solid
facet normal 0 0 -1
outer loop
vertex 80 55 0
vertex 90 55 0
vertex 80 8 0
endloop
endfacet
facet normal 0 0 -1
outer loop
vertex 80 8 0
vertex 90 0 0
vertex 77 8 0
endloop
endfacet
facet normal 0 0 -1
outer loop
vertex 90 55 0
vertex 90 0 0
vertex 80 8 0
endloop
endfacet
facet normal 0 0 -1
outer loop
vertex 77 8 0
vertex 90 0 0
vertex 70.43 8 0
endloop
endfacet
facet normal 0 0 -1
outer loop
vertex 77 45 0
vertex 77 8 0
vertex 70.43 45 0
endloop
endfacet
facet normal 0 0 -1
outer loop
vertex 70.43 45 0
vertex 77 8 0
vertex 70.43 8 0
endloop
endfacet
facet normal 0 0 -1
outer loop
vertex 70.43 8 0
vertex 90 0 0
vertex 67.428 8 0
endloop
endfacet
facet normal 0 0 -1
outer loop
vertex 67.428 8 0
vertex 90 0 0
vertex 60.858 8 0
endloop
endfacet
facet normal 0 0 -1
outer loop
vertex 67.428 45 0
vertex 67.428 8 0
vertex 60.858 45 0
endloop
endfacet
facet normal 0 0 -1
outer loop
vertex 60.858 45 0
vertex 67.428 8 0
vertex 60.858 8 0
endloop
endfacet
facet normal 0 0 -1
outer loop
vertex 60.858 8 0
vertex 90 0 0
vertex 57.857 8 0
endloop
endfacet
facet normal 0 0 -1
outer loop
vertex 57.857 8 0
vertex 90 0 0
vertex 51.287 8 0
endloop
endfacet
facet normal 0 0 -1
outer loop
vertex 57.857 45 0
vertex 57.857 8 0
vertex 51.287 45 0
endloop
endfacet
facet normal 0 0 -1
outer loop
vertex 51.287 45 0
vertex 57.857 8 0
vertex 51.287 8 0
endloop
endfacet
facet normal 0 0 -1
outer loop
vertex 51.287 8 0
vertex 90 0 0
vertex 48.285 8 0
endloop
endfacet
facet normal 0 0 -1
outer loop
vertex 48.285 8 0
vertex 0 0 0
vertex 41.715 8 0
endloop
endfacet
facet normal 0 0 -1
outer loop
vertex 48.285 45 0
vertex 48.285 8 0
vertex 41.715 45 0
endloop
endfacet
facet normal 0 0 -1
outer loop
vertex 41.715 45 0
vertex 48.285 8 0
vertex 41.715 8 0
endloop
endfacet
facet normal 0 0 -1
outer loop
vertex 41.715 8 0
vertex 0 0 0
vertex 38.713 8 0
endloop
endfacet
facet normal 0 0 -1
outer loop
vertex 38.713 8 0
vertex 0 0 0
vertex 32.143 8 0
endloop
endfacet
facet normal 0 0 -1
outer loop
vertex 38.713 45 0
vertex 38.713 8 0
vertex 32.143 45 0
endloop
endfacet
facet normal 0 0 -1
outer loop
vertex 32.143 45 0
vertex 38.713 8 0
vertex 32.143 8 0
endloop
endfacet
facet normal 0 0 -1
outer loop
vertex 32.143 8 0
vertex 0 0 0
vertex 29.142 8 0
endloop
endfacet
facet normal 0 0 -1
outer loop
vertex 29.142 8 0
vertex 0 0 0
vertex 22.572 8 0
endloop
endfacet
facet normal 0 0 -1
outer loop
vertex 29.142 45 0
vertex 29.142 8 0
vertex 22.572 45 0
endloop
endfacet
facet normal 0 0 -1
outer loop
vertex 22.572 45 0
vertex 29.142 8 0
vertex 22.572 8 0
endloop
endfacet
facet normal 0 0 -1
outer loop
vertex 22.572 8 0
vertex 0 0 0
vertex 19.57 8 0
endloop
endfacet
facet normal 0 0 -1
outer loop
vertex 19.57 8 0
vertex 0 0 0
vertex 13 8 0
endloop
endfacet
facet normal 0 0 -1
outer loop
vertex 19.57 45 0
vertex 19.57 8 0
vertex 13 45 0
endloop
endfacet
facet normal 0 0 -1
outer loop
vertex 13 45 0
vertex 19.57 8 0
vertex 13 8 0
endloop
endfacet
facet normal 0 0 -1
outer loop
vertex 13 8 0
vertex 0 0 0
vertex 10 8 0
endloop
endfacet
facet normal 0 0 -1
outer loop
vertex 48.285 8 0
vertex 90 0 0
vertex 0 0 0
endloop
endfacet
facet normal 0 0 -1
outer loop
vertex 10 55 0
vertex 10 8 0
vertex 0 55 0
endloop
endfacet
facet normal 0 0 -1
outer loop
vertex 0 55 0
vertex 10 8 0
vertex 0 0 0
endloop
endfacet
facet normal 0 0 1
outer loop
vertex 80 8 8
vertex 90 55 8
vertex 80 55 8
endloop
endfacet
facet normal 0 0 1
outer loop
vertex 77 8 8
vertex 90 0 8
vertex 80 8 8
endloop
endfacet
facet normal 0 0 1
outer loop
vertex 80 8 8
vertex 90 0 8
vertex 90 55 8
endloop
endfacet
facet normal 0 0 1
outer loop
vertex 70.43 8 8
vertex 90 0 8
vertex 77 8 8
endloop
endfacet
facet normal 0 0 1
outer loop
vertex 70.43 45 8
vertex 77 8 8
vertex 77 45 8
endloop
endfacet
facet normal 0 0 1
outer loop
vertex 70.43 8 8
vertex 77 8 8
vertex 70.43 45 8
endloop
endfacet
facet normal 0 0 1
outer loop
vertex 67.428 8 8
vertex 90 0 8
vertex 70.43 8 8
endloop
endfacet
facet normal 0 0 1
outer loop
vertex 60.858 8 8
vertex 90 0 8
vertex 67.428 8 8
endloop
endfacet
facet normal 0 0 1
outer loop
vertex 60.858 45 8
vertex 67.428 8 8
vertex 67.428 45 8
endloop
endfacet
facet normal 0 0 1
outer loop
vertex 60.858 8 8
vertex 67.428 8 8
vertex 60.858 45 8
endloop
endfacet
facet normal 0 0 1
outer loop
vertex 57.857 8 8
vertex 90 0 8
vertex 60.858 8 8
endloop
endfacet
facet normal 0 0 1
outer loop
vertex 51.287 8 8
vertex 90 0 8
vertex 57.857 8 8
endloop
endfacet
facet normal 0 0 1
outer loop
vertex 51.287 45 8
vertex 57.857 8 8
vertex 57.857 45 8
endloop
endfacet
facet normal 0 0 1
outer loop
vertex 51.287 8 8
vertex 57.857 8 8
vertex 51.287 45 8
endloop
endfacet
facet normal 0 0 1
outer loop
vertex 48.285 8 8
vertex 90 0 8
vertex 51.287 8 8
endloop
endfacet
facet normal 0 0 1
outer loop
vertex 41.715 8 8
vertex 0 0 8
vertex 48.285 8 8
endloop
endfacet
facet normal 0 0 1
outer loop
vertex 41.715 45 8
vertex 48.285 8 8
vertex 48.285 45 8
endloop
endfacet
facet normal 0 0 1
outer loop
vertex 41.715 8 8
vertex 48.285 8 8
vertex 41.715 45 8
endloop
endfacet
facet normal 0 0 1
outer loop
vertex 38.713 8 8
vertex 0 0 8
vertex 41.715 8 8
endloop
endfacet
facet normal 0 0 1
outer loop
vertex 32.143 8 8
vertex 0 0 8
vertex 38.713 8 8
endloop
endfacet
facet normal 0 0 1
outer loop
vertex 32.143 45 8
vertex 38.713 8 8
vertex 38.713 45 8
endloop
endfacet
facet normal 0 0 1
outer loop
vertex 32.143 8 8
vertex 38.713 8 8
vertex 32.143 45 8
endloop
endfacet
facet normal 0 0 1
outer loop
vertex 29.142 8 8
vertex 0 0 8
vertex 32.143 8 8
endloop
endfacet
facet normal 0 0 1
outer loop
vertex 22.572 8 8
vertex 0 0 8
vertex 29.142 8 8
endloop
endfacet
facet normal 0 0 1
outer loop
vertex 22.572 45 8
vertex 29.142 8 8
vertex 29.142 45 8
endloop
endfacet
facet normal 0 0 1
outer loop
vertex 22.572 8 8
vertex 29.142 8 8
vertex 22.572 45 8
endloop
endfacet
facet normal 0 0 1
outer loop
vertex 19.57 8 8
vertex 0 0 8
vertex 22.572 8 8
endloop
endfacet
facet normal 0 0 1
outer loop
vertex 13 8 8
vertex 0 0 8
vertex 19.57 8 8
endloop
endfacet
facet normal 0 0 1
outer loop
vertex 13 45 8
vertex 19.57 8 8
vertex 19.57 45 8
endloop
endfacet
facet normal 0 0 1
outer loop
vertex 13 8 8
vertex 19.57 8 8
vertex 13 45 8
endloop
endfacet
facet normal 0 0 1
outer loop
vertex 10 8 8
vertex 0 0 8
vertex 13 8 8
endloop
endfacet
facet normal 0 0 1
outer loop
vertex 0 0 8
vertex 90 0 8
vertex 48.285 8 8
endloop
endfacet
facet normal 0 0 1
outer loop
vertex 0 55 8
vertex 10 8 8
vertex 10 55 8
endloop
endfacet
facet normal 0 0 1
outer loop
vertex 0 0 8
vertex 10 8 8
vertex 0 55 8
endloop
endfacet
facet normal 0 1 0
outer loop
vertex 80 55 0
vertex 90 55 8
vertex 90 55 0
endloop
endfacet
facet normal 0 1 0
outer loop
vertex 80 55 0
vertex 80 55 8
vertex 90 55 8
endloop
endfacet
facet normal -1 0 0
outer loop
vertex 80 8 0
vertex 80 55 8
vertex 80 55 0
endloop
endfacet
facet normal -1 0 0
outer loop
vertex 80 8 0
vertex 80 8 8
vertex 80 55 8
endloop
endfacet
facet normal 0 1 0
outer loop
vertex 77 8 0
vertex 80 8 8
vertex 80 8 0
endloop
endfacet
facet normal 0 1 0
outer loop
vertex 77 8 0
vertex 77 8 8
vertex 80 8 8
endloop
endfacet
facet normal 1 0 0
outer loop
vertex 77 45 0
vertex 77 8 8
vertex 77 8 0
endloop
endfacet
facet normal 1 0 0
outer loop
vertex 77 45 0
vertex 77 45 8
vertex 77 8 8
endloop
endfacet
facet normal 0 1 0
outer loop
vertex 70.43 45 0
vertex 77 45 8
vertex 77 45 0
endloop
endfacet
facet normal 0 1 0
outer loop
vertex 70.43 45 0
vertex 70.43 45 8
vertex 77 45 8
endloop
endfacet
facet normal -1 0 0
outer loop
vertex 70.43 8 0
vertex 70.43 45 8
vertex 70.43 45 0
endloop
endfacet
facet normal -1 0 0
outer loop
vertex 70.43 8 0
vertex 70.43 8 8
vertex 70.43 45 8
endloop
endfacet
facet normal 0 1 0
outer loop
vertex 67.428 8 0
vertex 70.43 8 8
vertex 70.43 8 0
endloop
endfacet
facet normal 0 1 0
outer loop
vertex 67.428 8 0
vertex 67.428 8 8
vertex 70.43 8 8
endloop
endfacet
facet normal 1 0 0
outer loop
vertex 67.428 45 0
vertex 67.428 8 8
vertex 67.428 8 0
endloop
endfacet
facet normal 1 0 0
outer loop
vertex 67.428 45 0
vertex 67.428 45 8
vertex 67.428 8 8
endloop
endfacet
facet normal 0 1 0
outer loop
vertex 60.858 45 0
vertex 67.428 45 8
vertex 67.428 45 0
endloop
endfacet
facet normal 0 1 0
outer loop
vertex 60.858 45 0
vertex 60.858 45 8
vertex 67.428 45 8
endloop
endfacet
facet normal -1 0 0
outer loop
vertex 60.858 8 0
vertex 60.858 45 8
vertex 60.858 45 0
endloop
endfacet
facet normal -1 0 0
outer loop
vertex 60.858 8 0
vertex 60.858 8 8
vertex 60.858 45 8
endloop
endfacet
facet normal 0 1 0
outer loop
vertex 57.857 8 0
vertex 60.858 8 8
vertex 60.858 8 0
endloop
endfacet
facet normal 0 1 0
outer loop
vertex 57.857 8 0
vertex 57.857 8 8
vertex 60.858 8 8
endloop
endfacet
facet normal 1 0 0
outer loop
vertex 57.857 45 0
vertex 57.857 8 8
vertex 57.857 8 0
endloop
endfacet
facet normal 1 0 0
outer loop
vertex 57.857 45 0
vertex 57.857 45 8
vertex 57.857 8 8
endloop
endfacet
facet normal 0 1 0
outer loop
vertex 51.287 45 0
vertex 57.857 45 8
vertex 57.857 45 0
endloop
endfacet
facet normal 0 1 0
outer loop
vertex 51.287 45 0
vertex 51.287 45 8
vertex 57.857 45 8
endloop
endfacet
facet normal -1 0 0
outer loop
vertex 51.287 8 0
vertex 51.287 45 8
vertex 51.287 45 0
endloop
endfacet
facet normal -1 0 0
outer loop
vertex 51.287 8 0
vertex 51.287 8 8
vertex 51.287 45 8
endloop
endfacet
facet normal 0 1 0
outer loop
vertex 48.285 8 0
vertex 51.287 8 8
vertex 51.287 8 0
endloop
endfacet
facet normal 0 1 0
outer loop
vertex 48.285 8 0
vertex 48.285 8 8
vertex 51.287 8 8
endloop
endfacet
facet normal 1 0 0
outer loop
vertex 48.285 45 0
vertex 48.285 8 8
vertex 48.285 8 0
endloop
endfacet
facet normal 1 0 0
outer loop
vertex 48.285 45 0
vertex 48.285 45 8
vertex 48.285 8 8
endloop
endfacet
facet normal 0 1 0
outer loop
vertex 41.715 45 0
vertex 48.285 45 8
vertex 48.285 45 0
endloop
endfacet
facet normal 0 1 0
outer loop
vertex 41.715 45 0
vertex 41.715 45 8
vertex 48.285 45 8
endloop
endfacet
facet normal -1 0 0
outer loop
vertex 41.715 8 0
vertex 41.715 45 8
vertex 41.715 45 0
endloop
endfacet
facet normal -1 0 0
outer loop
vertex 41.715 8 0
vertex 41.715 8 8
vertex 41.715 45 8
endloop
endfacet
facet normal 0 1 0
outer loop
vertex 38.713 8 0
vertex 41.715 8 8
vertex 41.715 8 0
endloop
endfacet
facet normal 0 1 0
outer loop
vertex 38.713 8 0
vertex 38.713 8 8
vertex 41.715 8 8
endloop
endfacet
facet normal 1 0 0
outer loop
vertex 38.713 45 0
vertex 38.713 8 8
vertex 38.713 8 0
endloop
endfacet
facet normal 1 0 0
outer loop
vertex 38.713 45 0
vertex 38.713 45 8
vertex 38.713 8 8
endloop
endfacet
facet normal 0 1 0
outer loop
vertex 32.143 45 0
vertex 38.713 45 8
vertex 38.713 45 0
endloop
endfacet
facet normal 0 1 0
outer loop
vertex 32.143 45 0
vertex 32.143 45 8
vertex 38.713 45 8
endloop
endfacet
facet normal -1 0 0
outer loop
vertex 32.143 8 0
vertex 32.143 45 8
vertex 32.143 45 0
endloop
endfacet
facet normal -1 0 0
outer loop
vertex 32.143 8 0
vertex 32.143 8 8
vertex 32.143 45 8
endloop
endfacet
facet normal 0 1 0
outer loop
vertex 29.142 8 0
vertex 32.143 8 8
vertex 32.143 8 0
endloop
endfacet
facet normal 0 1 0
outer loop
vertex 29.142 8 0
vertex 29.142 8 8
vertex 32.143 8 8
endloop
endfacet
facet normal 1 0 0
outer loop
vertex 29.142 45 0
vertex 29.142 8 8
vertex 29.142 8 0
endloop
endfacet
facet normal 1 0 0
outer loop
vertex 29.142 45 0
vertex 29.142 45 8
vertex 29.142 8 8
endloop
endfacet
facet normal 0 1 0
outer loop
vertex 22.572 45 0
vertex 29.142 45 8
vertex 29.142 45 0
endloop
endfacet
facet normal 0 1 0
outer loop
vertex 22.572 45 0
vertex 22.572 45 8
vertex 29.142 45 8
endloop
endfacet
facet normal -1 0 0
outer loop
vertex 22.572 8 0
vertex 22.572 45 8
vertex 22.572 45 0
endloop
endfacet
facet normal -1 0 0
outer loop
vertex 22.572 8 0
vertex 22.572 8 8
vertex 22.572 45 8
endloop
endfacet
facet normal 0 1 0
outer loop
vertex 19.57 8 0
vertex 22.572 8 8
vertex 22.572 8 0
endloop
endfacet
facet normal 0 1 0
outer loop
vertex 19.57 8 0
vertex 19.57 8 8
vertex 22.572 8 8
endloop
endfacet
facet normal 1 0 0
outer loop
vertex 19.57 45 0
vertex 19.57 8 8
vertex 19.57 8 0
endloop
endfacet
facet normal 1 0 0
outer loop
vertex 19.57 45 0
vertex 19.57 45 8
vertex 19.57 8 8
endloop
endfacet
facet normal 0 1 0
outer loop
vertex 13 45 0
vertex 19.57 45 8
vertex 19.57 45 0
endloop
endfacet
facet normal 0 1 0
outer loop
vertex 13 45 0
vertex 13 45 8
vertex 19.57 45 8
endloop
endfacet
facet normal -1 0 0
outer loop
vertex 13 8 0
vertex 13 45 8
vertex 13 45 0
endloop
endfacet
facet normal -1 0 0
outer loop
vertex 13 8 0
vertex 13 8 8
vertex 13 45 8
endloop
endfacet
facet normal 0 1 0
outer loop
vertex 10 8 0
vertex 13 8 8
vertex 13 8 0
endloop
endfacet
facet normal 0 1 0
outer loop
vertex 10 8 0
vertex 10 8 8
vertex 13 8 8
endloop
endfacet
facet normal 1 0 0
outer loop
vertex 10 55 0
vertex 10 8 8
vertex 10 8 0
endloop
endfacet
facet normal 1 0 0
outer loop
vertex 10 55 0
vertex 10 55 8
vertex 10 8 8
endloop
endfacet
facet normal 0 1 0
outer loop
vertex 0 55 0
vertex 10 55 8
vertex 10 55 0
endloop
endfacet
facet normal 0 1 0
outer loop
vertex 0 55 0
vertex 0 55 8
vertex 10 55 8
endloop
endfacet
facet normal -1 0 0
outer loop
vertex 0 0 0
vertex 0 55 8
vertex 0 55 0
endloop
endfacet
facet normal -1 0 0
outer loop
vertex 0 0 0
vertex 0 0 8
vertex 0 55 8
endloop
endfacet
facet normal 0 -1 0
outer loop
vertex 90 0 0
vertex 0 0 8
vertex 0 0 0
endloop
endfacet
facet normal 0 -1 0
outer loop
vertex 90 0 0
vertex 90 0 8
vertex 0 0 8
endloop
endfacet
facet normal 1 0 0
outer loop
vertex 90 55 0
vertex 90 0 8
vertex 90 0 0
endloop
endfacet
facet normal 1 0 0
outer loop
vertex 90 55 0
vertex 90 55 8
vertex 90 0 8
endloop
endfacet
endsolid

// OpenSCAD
$fn = 32;

// ----------------------------------------------------------------------
// Guard grille: 7 slats over a 90 x 55 mm plate
// ----------------------------------------------------------------------

// --- parameters (mm) ---
profile_height = 8;       // extrusion height
profile_points = 36;      // points of the closed outline

profile = [[0, 0], [90, 0], [90, 55], [80, 55], [80, 8], [77, 8], [77, 45], [70.43, 45], [70.43, 8], [67.428, 8], [67.428, 45], [60.858, 45], [60.858, 8], [57.857, 8], [57.857, 45], [51.287, 45], [51.287, 8], [48.285, 8], [48.285, 45], [41.715, 45], [41.715, 8], [38.713, 8], [38.713, 45], [32.143, 45], [32.143, 8], [29.142, 8], [29.142, 45], [22.572, 45], [22.572, 8], [19.57, 8], [19.57, 45], [13, 45], [13, 8], [10, 8], [10, 55], [0, 55]];  // single closed polygon, 36 points, counter clockwise

// --- the one profile operation ---
linear_extrude(height = profile_height) polygon(points = profile);
